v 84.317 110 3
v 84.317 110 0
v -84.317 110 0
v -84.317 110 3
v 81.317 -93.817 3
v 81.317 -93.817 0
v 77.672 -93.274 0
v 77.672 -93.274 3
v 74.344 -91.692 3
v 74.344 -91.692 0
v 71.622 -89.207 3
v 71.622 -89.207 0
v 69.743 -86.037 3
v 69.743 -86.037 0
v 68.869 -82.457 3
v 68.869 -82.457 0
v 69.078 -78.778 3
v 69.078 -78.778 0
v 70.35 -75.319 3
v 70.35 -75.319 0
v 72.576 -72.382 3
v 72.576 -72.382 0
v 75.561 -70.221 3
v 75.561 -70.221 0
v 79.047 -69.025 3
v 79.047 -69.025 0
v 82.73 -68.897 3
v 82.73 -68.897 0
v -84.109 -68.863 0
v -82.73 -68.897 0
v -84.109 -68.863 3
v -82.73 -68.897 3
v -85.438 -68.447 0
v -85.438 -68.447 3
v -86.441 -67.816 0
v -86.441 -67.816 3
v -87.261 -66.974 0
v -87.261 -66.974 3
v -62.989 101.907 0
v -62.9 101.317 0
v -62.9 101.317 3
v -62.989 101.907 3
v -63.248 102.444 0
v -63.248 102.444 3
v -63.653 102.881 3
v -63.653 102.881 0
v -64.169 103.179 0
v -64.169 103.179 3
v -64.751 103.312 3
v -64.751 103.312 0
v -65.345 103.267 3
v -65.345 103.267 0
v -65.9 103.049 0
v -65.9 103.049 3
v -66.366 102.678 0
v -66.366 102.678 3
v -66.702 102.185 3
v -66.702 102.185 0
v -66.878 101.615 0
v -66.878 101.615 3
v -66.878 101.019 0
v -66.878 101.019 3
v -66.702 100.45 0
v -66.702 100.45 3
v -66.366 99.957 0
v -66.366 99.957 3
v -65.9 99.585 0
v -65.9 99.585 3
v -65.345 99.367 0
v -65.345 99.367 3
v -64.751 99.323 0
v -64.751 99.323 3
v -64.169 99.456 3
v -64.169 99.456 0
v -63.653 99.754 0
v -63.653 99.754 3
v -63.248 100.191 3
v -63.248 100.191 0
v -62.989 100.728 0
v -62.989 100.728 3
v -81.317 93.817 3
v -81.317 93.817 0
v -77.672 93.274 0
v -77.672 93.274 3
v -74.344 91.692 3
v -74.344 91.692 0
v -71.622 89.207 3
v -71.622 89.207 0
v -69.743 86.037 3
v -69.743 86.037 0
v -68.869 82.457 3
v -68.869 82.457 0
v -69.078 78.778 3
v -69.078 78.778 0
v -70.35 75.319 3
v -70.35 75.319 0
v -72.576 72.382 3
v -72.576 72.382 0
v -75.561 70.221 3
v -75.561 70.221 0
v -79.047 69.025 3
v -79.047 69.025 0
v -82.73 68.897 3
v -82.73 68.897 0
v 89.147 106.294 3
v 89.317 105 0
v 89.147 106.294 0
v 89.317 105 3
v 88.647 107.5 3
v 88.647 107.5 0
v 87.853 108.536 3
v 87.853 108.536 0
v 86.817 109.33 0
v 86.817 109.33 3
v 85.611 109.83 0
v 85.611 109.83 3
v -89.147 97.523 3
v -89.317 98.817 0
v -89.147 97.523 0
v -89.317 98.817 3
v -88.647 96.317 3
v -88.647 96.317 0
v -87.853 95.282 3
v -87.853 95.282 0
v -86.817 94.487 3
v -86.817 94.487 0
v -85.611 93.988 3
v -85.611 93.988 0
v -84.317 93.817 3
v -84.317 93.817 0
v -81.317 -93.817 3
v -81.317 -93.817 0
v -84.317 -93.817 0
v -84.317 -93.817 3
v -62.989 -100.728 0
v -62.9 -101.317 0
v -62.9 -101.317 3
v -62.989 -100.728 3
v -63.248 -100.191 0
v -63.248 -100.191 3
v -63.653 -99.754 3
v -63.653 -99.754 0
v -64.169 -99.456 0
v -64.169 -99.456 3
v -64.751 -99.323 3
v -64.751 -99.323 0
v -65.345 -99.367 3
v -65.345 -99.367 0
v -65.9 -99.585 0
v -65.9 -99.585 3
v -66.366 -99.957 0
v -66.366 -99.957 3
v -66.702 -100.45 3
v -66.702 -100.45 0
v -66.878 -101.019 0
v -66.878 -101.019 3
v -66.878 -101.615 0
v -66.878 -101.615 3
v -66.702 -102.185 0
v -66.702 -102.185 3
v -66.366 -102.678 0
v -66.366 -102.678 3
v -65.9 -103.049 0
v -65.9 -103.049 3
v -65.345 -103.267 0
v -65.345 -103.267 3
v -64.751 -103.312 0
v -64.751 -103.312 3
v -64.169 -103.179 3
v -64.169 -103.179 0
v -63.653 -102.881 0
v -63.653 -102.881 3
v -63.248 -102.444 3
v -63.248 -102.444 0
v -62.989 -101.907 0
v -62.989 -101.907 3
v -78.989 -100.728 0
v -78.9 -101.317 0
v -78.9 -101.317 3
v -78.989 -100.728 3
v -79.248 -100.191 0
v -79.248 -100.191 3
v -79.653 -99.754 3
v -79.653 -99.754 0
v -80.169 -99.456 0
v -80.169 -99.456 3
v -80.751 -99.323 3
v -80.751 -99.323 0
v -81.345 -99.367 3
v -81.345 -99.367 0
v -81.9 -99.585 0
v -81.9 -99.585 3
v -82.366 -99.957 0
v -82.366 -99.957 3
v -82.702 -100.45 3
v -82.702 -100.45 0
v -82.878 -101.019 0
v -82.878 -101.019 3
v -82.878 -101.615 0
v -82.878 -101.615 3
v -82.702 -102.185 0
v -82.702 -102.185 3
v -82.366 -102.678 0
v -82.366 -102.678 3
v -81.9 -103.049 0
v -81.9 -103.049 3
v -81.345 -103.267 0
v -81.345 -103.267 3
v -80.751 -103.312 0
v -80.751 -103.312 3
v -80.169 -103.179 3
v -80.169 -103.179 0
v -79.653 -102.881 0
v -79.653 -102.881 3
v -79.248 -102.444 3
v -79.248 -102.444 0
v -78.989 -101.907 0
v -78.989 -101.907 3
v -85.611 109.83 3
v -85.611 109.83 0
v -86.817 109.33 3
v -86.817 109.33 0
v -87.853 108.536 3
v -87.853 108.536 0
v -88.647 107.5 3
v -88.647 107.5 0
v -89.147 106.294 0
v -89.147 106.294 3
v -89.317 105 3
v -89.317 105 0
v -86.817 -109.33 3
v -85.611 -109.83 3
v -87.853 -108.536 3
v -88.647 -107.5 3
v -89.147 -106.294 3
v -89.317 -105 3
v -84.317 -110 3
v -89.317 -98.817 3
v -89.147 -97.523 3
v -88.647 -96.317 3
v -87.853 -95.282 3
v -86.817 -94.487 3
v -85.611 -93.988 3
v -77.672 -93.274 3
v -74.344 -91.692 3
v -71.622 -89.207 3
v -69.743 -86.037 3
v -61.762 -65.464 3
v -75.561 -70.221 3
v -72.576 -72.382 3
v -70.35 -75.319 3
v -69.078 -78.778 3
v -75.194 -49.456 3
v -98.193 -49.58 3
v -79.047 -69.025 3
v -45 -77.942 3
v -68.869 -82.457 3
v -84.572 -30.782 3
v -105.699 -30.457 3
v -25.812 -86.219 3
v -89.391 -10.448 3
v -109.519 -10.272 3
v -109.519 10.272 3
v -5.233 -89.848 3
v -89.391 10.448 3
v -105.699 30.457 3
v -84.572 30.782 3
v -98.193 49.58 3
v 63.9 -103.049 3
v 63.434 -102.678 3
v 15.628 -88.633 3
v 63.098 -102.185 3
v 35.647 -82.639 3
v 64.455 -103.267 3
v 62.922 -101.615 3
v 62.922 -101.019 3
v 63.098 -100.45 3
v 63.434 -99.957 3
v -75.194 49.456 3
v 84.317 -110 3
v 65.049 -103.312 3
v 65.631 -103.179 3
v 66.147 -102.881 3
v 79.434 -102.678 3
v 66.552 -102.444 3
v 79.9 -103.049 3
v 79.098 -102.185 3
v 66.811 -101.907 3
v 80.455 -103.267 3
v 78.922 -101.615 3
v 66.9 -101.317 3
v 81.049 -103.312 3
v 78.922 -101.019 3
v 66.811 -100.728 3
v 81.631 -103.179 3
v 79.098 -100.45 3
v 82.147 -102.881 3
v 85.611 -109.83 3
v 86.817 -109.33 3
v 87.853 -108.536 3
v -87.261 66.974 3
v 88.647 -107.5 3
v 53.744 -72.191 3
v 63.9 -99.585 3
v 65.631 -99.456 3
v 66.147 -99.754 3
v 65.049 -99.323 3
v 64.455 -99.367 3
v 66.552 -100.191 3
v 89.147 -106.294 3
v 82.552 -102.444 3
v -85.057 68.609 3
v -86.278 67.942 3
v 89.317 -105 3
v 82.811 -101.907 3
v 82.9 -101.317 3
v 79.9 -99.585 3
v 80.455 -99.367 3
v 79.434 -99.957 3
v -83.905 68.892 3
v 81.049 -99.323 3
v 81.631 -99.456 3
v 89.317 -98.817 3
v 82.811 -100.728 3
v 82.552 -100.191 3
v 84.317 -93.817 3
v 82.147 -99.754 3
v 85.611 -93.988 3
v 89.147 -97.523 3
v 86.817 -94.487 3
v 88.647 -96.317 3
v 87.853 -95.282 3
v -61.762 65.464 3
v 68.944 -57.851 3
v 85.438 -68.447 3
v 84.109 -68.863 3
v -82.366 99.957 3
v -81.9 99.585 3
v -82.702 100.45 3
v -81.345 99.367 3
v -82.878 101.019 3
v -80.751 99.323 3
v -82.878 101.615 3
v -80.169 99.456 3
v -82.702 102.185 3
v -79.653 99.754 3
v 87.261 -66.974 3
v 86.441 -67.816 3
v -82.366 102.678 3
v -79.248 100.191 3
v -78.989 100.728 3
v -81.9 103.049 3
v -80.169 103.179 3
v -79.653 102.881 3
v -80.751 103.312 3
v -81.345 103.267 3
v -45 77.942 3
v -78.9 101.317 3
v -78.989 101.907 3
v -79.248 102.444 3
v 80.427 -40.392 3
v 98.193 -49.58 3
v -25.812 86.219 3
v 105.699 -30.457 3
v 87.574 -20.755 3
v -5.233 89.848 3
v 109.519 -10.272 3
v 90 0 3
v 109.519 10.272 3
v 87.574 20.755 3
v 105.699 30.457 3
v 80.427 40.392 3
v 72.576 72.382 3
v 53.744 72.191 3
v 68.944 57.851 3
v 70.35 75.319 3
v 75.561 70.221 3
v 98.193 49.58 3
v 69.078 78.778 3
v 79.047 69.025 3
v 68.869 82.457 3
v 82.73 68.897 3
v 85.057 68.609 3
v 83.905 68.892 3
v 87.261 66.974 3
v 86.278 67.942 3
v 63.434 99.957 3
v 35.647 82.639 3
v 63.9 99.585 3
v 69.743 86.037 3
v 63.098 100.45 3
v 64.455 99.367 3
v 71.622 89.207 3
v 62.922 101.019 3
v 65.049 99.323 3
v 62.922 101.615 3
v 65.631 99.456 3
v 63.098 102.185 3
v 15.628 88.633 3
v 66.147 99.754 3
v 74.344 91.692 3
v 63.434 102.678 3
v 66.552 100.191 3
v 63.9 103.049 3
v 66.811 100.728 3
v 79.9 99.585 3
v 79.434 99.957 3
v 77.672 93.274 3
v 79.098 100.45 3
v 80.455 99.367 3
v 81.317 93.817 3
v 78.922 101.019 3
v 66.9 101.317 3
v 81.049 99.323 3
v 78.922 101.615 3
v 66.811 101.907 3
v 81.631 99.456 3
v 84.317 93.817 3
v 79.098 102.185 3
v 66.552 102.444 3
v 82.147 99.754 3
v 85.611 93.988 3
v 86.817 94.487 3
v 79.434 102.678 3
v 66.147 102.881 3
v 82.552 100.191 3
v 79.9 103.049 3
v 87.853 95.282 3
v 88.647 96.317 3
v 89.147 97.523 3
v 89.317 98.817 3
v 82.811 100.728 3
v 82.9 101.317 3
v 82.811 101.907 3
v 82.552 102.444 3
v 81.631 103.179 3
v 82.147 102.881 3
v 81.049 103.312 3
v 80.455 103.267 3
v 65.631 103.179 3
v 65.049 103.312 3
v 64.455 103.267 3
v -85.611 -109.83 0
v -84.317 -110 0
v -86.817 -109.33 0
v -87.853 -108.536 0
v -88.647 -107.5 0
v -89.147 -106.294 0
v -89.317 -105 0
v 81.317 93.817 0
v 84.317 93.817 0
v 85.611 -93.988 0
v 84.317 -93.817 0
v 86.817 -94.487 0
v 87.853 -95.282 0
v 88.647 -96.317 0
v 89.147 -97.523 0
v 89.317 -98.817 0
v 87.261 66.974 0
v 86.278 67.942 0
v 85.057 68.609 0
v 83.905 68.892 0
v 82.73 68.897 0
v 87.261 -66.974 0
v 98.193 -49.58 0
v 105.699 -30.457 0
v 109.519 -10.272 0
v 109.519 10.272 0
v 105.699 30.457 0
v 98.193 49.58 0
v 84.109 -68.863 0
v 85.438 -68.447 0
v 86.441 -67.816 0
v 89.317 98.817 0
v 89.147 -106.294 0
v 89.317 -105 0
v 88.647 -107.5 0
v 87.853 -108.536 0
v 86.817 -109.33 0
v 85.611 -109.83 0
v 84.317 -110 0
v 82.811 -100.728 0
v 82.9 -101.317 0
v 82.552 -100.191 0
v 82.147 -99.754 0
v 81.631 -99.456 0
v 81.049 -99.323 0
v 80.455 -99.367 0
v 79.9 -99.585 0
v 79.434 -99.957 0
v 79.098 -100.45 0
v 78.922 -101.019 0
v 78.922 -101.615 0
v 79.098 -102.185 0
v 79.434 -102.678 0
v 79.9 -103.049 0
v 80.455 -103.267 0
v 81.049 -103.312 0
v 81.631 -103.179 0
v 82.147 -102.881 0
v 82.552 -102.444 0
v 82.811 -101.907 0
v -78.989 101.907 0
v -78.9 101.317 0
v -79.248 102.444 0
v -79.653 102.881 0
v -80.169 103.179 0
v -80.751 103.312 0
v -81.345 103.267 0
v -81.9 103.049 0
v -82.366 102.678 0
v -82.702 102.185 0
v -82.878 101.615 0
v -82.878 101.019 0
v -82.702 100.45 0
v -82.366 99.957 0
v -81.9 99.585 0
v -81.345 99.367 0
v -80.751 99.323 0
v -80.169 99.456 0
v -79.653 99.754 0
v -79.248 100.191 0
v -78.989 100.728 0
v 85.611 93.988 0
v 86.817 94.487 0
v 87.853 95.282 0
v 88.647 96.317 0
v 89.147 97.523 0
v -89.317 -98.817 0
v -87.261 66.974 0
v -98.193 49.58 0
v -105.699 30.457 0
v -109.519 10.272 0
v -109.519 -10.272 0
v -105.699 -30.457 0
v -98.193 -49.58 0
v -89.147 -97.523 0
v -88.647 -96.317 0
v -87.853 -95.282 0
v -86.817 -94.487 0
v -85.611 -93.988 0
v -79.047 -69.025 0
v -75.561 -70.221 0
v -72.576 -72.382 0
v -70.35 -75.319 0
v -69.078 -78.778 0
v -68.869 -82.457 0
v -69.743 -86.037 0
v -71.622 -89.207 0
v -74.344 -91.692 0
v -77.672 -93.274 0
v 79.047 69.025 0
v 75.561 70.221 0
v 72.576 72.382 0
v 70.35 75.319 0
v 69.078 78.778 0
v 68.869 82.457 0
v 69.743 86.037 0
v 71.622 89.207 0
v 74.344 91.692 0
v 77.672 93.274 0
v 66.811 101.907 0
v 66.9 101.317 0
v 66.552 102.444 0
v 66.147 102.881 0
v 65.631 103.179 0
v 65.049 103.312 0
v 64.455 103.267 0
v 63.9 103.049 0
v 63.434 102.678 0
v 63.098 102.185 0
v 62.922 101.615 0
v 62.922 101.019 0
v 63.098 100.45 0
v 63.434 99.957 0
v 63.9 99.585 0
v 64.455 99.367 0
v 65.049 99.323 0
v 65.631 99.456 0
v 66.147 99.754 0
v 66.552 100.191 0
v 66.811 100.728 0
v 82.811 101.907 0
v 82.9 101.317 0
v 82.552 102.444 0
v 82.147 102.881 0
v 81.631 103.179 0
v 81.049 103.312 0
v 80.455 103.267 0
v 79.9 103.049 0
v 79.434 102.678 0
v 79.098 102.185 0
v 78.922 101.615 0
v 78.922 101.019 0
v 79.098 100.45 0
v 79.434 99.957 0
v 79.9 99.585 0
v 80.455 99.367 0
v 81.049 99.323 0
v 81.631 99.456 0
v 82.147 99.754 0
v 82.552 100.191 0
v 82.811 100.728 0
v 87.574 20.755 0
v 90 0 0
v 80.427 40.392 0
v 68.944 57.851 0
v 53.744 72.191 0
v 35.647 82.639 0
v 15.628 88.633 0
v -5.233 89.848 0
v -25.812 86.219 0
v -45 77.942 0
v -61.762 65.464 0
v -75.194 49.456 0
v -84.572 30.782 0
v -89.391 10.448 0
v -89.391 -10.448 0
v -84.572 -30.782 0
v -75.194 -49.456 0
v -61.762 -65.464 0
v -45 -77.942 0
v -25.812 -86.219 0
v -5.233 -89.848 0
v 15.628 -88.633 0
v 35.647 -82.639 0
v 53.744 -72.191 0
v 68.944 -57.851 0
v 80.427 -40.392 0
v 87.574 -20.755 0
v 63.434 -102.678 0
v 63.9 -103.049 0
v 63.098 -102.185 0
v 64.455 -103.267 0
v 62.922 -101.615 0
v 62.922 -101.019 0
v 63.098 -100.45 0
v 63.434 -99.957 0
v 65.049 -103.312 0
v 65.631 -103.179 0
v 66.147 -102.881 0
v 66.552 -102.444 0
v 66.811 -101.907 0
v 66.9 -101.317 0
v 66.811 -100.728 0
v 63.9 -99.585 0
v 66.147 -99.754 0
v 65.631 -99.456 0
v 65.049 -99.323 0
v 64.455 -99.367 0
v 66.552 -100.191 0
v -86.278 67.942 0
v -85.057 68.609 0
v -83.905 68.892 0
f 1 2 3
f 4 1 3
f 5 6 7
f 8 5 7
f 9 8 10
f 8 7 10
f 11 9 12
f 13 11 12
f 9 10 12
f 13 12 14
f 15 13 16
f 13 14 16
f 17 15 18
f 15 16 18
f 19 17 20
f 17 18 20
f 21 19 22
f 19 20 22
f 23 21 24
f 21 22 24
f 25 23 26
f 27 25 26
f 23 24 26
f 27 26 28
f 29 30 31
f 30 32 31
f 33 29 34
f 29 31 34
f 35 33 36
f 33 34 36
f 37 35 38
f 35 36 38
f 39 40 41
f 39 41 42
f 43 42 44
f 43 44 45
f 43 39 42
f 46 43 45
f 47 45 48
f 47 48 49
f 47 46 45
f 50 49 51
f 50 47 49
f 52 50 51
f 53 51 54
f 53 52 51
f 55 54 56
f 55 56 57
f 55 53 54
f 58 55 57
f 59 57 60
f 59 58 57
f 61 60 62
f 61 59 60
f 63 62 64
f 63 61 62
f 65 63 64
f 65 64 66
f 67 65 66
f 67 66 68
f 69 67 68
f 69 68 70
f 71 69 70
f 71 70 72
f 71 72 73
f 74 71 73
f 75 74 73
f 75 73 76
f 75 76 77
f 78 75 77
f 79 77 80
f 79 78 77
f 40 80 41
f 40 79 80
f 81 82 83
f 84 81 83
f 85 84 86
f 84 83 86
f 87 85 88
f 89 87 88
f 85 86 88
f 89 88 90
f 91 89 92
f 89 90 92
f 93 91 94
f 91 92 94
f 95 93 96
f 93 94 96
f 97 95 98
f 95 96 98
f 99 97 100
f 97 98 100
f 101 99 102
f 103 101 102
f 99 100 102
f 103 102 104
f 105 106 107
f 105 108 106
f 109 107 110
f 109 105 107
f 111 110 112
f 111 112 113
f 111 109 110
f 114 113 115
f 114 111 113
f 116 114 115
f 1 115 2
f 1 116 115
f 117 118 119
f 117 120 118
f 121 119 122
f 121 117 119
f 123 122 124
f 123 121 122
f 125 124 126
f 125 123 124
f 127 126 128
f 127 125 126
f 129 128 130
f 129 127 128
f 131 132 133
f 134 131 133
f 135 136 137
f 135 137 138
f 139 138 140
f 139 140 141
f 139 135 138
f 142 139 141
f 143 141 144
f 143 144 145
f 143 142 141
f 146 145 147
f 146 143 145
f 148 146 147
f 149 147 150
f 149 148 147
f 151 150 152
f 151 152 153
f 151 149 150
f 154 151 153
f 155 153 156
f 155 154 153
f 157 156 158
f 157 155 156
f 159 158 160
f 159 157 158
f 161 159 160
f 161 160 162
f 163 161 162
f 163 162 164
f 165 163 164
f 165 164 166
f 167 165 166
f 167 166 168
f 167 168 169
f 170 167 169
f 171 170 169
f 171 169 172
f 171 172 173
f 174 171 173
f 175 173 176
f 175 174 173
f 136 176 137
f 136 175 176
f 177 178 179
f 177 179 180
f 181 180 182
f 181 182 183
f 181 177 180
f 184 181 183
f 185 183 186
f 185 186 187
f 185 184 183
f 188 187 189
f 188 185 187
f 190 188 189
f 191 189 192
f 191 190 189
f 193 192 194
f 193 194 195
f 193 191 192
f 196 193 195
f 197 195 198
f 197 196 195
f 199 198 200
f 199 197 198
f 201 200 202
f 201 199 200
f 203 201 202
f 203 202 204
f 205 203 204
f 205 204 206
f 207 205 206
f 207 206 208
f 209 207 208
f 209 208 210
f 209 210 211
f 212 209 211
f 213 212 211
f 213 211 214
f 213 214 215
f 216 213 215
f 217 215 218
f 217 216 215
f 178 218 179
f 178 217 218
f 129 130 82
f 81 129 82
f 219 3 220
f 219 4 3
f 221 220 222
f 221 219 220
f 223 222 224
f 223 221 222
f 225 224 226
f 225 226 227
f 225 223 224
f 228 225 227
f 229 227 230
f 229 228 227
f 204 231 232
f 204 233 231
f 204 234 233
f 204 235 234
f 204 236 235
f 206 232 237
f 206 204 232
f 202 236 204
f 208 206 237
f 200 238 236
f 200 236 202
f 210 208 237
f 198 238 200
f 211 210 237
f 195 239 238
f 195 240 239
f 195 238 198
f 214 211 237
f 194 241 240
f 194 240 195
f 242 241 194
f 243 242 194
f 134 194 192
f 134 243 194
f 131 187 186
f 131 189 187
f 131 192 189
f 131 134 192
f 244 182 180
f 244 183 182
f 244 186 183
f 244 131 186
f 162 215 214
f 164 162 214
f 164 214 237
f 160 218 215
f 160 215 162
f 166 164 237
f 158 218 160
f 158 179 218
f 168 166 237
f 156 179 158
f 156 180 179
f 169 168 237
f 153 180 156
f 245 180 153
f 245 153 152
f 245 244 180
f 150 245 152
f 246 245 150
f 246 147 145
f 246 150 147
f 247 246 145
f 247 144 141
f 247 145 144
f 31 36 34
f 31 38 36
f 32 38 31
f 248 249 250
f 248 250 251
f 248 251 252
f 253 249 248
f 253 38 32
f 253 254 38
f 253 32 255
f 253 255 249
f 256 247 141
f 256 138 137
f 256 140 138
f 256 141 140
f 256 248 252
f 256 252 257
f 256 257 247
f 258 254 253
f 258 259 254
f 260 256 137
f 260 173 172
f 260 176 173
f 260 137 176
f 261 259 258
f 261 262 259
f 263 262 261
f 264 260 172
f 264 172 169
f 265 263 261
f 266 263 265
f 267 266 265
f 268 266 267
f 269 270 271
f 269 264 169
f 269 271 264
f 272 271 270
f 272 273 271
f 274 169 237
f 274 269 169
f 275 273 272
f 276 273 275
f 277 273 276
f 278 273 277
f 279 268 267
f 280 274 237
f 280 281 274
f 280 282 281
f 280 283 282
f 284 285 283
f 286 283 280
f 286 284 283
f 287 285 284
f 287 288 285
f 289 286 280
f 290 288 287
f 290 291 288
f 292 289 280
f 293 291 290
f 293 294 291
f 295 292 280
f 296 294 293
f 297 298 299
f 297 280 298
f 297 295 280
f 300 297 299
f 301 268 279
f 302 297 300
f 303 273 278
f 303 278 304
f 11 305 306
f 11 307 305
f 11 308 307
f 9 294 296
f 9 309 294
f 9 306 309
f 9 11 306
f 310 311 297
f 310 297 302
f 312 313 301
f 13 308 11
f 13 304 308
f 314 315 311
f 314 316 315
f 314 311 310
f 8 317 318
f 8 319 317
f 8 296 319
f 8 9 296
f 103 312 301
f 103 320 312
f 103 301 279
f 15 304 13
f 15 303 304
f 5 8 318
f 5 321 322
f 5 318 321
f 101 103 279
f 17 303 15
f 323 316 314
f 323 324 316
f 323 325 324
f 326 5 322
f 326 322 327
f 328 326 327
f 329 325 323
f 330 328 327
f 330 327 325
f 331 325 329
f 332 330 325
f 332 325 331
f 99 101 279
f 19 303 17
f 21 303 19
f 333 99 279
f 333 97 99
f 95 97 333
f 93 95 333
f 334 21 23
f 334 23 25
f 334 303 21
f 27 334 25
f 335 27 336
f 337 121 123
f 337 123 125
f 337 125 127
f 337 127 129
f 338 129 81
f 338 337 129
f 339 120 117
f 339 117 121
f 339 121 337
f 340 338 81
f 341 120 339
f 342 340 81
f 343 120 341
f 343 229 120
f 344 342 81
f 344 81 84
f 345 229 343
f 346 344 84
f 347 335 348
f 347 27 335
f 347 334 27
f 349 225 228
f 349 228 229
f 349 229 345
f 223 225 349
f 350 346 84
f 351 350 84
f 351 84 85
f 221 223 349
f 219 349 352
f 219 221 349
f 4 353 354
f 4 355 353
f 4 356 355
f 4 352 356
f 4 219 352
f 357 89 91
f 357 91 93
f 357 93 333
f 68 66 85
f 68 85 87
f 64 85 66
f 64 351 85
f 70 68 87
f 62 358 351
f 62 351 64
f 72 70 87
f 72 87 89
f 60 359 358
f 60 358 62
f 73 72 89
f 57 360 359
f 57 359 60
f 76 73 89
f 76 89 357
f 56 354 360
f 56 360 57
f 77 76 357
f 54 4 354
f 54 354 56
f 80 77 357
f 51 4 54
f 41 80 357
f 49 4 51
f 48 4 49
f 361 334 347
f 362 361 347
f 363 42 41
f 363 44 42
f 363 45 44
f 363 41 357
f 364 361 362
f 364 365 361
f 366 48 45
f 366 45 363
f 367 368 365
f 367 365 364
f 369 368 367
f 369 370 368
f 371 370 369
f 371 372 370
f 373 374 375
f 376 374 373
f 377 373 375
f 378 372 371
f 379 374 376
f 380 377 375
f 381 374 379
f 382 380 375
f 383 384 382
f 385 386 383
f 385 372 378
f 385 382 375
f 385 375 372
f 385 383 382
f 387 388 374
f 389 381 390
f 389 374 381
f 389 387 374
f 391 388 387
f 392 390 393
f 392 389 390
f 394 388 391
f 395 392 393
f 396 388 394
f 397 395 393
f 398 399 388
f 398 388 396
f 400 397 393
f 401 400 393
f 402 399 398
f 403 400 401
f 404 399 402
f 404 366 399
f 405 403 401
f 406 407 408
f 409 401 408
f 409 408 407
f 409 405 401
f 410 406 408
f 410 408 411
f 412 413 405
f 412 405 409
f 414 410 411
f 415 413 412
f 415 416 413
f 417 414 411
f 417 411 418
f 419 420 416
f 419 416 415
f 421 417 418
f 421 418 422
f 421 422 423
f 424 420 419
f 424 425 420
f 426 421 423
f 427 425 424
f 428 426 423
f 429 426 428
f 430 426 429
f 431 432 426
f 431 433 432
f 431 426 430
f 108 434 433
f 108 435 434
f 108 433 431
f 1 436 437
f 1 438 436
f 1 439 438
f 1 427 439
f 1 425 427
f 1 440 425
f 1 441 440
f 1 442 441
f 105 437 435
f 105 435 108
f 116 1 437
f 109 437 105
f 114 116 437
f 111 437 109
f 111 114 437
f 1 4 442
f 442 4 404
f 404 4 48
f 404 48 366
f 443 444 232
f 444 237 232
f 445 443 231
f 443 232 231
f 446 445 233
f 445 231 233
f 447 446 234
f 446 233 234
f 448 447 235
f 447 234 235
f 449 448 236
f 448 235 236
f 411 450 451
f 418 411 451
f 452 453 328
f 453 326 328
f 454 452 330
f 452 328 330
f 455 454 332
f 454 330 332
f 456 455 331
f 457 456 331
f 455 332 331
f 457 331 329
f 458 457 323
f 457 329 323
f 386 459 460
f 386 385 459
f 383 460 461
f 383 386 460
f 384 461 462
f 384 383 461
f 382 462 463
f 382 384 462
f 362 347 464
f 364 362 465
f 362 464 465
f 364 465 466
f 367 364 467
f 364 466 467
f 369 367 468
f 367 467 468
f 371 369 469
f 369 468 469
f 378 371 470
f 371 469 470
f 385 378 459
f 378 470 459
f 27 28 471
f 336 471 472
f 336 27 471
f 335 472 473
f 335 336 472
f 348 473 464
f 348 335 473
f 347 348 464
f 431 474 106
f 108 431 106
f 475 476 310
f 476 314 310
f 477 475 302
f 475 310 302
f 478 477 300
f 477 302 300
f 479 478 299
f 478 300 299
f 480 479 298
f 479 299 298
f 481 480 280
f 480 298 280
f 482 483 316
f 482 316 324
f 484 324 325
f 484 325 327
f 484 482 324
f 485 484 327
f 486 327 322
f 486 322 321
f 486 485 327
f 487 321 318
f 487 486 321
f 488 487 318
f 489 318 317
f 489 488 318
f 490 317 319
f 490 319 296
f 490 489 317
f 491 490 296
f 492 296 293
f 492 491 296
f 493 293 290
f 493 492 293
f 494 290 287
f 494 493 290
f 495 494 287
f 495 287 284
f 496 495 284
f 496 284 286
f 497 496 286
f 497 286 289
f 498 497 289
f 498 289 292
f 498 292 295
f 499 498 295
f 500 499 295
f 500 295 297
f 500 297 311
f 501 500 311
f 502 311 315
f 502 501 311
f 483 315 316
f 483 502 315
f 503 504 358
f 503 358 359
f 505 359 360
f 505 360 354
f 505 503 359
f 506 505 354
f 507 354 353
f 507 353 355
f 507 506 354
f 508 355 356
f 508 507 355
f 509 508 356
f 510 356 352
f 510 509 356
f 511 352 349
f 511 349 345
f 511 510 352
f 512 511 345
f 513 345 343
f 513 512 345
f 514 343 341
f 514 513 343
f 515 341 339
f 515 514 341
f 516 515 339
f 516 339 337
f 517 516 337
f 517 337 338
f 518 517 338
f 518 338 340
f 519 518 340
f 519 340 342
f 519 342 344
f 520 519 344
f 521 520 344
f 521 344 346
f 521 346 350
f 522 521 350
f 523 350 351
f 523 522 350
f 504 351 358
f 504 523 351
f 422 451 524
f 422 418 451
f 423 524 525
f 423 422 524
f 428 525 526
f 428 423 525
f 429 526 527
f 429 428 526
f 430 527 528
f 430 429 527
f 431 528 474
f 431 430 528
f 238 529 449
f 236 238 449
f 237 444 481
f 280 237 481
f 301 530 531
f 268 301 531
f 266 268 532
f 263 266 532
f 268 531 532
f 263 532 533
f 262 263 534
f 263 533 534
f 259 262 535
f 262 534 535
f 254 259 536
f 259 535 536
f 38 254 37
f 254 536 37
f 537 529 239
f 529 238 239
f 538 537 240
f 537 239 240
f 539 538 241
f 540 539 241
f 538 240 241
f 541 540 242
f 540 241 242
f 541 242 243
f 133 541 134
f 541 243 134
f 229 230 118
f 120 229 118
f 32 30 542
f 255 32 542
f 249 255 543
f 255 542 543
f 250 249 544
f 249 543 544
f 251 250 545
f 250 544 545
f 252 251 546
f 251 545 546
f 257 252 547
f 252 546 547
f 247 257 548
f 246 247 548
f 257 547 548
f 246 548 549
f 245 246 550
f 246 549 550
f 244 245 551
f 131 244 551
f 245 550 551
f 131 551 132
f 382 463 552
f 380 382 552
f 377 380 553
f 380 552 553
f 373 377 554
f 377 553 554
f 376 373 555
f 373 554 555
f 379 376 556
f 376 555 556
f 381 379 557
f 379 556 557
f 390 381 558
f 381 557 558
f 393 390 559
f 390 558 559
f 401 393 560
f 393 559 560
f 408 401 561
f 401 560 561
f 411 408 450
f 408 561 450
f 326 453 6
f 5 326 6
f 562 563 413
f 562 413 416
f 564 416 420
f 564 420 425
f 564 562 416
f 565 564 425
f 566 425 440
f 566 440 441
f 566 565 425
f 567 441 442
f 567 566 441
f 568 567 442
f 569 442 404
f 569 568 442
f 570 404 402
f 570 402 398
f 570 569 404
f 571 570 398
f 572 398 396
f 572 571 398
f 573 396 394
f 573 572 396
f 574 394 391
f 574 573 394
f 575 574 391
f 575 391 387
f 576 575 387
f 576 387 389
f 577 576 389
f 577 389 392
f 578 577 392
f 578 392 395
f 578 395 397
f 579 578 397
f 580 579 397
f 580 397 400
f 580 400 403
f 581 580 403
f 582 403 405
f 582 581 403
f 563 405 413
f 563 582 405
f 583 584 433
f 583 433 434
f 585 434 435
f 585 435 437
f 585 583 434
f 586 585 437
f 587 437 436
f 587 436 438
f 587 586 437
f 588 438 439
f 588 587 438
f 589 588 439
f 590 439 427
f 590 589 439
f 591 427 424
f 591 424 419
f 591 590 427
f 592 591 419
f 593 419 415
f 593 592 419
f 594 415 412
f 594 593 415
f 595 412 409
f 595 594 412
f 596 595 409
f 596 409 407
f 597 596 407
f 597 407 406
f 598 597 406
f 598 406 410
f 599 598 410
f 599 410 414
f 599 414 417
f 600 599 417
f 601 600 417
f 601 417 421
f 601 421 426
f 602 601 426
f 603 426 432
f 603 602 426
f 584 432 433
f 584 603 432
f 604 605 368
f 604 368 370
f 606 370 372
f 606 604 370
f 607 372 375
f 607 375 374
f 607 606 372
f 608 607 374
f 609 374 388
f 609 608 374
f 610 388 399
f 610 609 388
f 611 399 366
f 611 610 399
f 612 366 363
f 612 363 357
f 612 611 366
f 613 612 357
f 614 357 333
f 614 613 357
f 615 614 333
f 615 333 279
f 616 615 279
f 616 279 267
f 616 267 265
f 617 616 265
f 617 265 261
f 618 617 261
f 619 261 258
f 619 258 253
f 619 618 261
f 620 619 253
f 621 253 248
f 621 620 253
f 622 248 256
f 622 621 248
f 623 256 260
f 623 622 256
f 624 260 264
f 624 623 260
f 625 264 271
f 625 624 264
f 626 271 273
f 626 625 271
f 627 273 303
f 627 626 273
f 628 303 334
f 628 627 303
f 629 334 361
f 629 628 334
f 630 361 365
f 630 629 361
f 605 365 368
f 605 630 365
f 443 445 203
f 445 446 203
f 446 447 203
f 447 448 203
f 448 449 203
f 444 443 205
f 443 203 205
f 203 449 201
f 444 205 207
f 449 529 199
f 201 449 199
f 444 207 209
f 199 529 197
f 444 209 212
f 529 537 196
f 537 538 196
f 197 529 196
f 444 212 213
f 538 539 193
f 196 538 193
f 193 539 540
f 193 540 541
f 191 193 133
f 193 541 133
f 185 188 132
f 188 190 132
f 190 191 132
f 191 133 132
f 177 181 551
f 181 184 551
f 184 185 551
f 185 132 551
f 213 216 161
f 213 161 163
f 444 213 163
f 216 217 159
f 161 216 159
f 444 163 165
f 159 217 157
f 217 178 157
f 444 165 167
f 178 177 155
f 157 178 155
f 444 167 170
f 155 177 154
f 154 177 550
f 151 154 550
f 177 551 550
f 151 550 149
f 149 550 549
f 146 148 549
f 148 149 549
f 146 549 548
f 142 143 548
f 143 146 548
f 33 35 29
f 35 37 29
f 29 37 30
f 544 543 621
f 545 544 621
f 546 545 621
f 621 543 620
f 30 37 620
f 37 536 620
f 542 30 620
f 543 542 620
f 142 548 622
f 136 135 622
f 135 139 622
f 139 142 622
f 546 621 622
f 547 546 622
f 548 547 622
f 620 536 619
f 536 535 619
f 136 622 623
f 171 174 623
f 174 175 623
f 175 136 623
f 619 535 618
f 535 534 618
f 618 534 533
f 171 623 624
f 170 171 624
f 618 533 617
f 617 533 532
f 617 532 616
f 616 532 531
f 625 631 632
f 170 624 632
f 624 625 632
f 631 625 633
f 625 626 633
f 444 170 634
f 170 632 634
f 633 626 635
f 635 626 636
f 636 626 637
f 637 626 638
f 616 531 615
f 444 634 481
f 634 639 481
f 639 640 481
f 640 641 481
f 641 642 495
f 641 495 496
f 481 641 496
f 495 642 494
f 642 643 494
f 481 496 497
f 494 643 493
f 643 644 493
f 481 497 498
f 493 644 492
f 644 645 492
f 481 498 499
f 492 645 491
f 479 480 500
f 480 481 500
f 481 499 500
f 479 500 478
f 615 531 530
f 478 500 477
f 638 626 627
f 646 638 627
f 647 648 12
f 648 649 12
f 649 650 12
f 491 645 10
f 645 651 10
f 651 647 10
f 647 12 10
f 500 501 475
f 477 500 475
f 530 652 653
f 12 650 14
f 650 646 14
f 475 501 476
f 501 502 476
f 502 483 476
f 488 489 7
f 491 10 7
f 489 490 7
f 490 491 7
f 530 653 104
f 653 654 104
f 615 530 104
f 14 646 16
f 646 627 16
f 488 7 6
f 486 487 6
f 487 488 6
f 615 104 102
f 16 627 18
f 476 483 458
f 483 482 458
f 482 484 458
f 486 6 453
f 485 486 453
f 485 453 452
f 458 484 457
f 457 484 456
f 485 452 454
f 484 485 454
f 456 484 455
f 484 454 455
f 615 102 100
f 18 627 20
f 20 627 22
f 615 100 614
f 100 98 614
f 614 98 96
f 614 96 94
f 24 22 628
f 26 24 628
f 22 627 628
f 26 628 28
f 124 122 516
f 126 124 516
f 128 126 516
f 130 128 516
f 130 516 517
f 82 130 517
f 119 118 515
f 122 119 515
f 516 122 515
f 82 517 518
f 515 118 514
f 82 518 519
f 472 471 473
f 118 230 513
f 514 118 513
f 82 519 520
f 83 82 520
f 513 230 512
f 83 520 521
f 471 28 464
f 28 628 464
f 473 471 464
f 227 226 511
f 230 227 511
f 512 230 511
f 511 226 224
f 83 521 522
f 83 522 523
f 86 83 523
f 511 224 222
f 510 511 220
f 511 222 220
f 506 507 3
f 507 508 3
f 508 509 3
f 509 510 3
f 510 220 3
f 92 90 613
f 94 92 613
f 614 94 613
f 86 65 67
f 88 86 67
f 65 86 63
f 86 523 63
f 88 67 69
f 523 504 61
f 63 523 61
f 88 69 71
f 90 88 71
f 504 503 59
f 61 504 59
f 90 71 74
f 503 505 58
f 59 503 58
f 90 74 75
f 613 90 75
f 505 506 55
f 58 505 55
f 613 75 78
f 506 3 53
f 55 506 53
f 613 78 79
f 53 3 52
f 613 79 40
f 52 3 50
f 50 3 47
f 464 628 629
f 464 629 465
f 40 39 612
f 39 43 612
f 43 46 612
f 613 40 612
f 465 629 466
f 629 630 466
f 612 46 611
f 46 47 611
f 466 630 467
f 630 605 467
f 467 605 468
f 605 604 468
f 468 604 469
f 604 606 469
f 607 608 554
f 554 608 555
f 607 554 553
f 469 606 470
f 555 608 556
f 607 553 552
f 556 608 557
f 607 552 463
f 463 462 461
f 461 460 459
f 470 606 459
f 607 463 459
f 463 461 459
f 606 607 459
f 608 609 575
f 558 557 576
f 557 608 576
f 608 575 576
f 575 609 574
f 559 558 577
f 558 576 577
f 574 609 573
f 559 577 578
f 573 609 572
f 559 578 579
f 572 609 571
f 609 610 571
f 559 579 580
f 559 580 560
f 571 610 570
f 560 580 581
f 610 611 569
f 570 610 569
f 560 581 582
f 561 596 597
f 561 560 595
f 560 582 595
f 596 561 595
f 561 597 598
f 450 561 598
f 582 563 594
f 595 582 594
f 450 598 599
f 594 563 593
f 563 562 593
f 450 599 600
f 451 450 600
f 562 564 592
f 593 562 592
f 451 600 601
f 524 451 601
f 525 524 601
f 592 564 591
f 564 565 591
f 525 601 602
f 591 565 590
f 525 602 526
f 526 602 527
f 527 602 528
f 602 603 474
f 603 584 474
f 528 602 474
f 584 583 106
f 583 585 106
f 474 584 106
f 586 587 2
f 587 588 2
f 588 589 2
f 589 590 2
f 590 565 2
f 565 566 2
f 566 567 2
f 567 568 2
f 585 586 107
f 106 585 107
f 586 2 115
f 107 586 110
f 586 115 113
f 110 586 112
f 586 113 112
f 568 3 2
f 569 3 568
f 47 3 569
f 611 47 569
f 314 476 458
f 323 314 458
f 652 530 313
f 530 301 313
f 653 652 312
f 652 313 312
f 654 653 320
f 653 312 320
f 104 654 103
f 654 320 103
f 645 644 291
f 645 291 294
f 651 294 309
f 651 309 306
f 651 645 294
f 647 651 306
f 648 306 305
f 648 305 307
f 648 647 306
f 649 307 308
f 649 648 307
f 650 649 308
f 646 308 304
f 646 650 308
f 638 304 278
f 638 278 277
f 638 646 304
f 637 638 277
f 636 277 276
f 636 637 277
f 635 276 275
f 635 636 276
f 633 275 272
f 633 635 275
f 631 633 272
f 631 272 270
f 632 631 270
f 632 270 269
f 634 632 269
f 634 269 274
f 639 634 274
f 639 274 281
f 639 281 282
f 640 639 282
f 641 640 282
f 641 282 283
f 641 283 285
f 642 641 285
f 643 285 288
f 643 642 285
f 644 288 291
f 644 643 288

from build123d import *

# Parameters (mm, degrees)
IZIM1_R                     = 2
IZIM1_R_2                   = 90
Y_KSEKLIK_EKSTR_ZYON1_DEPTH = 3
FILLET1_R                   = 5


with BuildPart() as part:
    # Çizim1 → Yükseklik-Ekstrüzyon1 (new body)
    with BuildSketch(Plane.XY):
        with BuildLine():
            ThreePointArc((81.317279836, -93.817279836), (68.980438262, -79.304237374), (85.290813588, -69.46565423))
            ThreePointArc((85.290813588, -69.46565423), (110, 0), (85.290813588, 69.46565423))
            ThreePointArc((85.290813588, 69.46565423), (68.980438262, 79.304237374), (81.317279836, 93.817279836))
            Line((81.317279836, 93.817279836), (89.317279836, 93.817279836))
            Line((89.317279836, 93.817279836), (89.317279836, 110))
            Line((89.317279836, 110), (-89.317279836, 110))
            Line((-89.317279836, 110), (-89.317279836, 93.817279836))
            Line((-89.317279836, 93.817279836), (-81.317279836, 93.817279836))
            ThreePointArc((-81.317279836, 93.817279836), (-68.980438262, 79.304237374), (-85.290813588, 69.46565423))
            ThreePointArc((-85.290813588, 69.46565423), (-110, 0), (-85.290813588, -69.46565423))
            ThreePointArc((-85.290813588, -69.46565423), (-68.980438262, -79.304237374), (-81.317279836, -93.817279836))
            Line((-81.317279836, -93.817279836), (-89.317279836, -93.817279836))
            Line((-89.317279836, -93.817279836), (-89.317279836, -110))
            Line((-89.317279836, -110), (89.317279836, -110))
            Line((89.317279836, -110), (89.317279836, -93.817279836))
            Line((89.317279836, -93.817279836), (81.317279836, -93.817279836))
        make_face()
        with Locations((-80.9, -101.317279836)):
            Circle(IZIM1_R, mode=Mode.SUBTRACT)
        with Locations((80.9, -101.317279836)):
            Circle(IZIM1_R, mode=Mode.SUBTRACT)
        Circle(IZIM1_R_2, mode=Mode.SUBTRACT)
        with Locations((64.9, 101.317279836)):
            Circle(IZIM1_R, mode=Mode.SUBTRACT)
        with Locations((80.9, 101.317279836)):
            Circle(IZIM1_R, mode=Mode.SUBTRACT)
        with Locations((-80.9, 101.317279836)):
            Circle(IZIM1_R, mode=Mode.SUBTRACT)
        with Locations((-64.9, 101.317279836)):
            Circle(IZIM1_R, mode=Mode.SUBTRACT)
        with Locations((64.9, -101.317279836)):
            Circle(IZIM1_R, mode=Mode.SUBTRACT)
        with Locations((-64.9, -101.317279836)):
            Circle(IZIM1_R, mode=Mode.SUBTRACT)
    extrude(amount=Y_KSEKLIK_EKSTR_ZYON1_DEPTH)

    # Fillet1
    fillet1_edges = [part.edges().sort_by_distance(p)[0] for p in [
        (89.317279836, -93.817279836, 1.5),
        (89.317279836, -110, 1.5),
        (-89.317279836, -110, 1.5),
        (-89.317279836, -93.817279836, 1.5),
        (-85.290813588, -69.46565423, 1.5),
        (-85.290813588, 69.46565423, 1.5),
        (-89.317279836, 93.817279836, 1.5),
        (-89.317279836, 110, 1.5),
        (89.317279836, 110, 1.5),
        (89.317279836, 93.817279836, 1.5),
        (85.290813588, 69.46565423, 1.5),
        (85.290813588, -69.46565423, 1.5),
    ]]
    fillet(fillet1_edges, radius=FILLET1_R)


solid = part.part
